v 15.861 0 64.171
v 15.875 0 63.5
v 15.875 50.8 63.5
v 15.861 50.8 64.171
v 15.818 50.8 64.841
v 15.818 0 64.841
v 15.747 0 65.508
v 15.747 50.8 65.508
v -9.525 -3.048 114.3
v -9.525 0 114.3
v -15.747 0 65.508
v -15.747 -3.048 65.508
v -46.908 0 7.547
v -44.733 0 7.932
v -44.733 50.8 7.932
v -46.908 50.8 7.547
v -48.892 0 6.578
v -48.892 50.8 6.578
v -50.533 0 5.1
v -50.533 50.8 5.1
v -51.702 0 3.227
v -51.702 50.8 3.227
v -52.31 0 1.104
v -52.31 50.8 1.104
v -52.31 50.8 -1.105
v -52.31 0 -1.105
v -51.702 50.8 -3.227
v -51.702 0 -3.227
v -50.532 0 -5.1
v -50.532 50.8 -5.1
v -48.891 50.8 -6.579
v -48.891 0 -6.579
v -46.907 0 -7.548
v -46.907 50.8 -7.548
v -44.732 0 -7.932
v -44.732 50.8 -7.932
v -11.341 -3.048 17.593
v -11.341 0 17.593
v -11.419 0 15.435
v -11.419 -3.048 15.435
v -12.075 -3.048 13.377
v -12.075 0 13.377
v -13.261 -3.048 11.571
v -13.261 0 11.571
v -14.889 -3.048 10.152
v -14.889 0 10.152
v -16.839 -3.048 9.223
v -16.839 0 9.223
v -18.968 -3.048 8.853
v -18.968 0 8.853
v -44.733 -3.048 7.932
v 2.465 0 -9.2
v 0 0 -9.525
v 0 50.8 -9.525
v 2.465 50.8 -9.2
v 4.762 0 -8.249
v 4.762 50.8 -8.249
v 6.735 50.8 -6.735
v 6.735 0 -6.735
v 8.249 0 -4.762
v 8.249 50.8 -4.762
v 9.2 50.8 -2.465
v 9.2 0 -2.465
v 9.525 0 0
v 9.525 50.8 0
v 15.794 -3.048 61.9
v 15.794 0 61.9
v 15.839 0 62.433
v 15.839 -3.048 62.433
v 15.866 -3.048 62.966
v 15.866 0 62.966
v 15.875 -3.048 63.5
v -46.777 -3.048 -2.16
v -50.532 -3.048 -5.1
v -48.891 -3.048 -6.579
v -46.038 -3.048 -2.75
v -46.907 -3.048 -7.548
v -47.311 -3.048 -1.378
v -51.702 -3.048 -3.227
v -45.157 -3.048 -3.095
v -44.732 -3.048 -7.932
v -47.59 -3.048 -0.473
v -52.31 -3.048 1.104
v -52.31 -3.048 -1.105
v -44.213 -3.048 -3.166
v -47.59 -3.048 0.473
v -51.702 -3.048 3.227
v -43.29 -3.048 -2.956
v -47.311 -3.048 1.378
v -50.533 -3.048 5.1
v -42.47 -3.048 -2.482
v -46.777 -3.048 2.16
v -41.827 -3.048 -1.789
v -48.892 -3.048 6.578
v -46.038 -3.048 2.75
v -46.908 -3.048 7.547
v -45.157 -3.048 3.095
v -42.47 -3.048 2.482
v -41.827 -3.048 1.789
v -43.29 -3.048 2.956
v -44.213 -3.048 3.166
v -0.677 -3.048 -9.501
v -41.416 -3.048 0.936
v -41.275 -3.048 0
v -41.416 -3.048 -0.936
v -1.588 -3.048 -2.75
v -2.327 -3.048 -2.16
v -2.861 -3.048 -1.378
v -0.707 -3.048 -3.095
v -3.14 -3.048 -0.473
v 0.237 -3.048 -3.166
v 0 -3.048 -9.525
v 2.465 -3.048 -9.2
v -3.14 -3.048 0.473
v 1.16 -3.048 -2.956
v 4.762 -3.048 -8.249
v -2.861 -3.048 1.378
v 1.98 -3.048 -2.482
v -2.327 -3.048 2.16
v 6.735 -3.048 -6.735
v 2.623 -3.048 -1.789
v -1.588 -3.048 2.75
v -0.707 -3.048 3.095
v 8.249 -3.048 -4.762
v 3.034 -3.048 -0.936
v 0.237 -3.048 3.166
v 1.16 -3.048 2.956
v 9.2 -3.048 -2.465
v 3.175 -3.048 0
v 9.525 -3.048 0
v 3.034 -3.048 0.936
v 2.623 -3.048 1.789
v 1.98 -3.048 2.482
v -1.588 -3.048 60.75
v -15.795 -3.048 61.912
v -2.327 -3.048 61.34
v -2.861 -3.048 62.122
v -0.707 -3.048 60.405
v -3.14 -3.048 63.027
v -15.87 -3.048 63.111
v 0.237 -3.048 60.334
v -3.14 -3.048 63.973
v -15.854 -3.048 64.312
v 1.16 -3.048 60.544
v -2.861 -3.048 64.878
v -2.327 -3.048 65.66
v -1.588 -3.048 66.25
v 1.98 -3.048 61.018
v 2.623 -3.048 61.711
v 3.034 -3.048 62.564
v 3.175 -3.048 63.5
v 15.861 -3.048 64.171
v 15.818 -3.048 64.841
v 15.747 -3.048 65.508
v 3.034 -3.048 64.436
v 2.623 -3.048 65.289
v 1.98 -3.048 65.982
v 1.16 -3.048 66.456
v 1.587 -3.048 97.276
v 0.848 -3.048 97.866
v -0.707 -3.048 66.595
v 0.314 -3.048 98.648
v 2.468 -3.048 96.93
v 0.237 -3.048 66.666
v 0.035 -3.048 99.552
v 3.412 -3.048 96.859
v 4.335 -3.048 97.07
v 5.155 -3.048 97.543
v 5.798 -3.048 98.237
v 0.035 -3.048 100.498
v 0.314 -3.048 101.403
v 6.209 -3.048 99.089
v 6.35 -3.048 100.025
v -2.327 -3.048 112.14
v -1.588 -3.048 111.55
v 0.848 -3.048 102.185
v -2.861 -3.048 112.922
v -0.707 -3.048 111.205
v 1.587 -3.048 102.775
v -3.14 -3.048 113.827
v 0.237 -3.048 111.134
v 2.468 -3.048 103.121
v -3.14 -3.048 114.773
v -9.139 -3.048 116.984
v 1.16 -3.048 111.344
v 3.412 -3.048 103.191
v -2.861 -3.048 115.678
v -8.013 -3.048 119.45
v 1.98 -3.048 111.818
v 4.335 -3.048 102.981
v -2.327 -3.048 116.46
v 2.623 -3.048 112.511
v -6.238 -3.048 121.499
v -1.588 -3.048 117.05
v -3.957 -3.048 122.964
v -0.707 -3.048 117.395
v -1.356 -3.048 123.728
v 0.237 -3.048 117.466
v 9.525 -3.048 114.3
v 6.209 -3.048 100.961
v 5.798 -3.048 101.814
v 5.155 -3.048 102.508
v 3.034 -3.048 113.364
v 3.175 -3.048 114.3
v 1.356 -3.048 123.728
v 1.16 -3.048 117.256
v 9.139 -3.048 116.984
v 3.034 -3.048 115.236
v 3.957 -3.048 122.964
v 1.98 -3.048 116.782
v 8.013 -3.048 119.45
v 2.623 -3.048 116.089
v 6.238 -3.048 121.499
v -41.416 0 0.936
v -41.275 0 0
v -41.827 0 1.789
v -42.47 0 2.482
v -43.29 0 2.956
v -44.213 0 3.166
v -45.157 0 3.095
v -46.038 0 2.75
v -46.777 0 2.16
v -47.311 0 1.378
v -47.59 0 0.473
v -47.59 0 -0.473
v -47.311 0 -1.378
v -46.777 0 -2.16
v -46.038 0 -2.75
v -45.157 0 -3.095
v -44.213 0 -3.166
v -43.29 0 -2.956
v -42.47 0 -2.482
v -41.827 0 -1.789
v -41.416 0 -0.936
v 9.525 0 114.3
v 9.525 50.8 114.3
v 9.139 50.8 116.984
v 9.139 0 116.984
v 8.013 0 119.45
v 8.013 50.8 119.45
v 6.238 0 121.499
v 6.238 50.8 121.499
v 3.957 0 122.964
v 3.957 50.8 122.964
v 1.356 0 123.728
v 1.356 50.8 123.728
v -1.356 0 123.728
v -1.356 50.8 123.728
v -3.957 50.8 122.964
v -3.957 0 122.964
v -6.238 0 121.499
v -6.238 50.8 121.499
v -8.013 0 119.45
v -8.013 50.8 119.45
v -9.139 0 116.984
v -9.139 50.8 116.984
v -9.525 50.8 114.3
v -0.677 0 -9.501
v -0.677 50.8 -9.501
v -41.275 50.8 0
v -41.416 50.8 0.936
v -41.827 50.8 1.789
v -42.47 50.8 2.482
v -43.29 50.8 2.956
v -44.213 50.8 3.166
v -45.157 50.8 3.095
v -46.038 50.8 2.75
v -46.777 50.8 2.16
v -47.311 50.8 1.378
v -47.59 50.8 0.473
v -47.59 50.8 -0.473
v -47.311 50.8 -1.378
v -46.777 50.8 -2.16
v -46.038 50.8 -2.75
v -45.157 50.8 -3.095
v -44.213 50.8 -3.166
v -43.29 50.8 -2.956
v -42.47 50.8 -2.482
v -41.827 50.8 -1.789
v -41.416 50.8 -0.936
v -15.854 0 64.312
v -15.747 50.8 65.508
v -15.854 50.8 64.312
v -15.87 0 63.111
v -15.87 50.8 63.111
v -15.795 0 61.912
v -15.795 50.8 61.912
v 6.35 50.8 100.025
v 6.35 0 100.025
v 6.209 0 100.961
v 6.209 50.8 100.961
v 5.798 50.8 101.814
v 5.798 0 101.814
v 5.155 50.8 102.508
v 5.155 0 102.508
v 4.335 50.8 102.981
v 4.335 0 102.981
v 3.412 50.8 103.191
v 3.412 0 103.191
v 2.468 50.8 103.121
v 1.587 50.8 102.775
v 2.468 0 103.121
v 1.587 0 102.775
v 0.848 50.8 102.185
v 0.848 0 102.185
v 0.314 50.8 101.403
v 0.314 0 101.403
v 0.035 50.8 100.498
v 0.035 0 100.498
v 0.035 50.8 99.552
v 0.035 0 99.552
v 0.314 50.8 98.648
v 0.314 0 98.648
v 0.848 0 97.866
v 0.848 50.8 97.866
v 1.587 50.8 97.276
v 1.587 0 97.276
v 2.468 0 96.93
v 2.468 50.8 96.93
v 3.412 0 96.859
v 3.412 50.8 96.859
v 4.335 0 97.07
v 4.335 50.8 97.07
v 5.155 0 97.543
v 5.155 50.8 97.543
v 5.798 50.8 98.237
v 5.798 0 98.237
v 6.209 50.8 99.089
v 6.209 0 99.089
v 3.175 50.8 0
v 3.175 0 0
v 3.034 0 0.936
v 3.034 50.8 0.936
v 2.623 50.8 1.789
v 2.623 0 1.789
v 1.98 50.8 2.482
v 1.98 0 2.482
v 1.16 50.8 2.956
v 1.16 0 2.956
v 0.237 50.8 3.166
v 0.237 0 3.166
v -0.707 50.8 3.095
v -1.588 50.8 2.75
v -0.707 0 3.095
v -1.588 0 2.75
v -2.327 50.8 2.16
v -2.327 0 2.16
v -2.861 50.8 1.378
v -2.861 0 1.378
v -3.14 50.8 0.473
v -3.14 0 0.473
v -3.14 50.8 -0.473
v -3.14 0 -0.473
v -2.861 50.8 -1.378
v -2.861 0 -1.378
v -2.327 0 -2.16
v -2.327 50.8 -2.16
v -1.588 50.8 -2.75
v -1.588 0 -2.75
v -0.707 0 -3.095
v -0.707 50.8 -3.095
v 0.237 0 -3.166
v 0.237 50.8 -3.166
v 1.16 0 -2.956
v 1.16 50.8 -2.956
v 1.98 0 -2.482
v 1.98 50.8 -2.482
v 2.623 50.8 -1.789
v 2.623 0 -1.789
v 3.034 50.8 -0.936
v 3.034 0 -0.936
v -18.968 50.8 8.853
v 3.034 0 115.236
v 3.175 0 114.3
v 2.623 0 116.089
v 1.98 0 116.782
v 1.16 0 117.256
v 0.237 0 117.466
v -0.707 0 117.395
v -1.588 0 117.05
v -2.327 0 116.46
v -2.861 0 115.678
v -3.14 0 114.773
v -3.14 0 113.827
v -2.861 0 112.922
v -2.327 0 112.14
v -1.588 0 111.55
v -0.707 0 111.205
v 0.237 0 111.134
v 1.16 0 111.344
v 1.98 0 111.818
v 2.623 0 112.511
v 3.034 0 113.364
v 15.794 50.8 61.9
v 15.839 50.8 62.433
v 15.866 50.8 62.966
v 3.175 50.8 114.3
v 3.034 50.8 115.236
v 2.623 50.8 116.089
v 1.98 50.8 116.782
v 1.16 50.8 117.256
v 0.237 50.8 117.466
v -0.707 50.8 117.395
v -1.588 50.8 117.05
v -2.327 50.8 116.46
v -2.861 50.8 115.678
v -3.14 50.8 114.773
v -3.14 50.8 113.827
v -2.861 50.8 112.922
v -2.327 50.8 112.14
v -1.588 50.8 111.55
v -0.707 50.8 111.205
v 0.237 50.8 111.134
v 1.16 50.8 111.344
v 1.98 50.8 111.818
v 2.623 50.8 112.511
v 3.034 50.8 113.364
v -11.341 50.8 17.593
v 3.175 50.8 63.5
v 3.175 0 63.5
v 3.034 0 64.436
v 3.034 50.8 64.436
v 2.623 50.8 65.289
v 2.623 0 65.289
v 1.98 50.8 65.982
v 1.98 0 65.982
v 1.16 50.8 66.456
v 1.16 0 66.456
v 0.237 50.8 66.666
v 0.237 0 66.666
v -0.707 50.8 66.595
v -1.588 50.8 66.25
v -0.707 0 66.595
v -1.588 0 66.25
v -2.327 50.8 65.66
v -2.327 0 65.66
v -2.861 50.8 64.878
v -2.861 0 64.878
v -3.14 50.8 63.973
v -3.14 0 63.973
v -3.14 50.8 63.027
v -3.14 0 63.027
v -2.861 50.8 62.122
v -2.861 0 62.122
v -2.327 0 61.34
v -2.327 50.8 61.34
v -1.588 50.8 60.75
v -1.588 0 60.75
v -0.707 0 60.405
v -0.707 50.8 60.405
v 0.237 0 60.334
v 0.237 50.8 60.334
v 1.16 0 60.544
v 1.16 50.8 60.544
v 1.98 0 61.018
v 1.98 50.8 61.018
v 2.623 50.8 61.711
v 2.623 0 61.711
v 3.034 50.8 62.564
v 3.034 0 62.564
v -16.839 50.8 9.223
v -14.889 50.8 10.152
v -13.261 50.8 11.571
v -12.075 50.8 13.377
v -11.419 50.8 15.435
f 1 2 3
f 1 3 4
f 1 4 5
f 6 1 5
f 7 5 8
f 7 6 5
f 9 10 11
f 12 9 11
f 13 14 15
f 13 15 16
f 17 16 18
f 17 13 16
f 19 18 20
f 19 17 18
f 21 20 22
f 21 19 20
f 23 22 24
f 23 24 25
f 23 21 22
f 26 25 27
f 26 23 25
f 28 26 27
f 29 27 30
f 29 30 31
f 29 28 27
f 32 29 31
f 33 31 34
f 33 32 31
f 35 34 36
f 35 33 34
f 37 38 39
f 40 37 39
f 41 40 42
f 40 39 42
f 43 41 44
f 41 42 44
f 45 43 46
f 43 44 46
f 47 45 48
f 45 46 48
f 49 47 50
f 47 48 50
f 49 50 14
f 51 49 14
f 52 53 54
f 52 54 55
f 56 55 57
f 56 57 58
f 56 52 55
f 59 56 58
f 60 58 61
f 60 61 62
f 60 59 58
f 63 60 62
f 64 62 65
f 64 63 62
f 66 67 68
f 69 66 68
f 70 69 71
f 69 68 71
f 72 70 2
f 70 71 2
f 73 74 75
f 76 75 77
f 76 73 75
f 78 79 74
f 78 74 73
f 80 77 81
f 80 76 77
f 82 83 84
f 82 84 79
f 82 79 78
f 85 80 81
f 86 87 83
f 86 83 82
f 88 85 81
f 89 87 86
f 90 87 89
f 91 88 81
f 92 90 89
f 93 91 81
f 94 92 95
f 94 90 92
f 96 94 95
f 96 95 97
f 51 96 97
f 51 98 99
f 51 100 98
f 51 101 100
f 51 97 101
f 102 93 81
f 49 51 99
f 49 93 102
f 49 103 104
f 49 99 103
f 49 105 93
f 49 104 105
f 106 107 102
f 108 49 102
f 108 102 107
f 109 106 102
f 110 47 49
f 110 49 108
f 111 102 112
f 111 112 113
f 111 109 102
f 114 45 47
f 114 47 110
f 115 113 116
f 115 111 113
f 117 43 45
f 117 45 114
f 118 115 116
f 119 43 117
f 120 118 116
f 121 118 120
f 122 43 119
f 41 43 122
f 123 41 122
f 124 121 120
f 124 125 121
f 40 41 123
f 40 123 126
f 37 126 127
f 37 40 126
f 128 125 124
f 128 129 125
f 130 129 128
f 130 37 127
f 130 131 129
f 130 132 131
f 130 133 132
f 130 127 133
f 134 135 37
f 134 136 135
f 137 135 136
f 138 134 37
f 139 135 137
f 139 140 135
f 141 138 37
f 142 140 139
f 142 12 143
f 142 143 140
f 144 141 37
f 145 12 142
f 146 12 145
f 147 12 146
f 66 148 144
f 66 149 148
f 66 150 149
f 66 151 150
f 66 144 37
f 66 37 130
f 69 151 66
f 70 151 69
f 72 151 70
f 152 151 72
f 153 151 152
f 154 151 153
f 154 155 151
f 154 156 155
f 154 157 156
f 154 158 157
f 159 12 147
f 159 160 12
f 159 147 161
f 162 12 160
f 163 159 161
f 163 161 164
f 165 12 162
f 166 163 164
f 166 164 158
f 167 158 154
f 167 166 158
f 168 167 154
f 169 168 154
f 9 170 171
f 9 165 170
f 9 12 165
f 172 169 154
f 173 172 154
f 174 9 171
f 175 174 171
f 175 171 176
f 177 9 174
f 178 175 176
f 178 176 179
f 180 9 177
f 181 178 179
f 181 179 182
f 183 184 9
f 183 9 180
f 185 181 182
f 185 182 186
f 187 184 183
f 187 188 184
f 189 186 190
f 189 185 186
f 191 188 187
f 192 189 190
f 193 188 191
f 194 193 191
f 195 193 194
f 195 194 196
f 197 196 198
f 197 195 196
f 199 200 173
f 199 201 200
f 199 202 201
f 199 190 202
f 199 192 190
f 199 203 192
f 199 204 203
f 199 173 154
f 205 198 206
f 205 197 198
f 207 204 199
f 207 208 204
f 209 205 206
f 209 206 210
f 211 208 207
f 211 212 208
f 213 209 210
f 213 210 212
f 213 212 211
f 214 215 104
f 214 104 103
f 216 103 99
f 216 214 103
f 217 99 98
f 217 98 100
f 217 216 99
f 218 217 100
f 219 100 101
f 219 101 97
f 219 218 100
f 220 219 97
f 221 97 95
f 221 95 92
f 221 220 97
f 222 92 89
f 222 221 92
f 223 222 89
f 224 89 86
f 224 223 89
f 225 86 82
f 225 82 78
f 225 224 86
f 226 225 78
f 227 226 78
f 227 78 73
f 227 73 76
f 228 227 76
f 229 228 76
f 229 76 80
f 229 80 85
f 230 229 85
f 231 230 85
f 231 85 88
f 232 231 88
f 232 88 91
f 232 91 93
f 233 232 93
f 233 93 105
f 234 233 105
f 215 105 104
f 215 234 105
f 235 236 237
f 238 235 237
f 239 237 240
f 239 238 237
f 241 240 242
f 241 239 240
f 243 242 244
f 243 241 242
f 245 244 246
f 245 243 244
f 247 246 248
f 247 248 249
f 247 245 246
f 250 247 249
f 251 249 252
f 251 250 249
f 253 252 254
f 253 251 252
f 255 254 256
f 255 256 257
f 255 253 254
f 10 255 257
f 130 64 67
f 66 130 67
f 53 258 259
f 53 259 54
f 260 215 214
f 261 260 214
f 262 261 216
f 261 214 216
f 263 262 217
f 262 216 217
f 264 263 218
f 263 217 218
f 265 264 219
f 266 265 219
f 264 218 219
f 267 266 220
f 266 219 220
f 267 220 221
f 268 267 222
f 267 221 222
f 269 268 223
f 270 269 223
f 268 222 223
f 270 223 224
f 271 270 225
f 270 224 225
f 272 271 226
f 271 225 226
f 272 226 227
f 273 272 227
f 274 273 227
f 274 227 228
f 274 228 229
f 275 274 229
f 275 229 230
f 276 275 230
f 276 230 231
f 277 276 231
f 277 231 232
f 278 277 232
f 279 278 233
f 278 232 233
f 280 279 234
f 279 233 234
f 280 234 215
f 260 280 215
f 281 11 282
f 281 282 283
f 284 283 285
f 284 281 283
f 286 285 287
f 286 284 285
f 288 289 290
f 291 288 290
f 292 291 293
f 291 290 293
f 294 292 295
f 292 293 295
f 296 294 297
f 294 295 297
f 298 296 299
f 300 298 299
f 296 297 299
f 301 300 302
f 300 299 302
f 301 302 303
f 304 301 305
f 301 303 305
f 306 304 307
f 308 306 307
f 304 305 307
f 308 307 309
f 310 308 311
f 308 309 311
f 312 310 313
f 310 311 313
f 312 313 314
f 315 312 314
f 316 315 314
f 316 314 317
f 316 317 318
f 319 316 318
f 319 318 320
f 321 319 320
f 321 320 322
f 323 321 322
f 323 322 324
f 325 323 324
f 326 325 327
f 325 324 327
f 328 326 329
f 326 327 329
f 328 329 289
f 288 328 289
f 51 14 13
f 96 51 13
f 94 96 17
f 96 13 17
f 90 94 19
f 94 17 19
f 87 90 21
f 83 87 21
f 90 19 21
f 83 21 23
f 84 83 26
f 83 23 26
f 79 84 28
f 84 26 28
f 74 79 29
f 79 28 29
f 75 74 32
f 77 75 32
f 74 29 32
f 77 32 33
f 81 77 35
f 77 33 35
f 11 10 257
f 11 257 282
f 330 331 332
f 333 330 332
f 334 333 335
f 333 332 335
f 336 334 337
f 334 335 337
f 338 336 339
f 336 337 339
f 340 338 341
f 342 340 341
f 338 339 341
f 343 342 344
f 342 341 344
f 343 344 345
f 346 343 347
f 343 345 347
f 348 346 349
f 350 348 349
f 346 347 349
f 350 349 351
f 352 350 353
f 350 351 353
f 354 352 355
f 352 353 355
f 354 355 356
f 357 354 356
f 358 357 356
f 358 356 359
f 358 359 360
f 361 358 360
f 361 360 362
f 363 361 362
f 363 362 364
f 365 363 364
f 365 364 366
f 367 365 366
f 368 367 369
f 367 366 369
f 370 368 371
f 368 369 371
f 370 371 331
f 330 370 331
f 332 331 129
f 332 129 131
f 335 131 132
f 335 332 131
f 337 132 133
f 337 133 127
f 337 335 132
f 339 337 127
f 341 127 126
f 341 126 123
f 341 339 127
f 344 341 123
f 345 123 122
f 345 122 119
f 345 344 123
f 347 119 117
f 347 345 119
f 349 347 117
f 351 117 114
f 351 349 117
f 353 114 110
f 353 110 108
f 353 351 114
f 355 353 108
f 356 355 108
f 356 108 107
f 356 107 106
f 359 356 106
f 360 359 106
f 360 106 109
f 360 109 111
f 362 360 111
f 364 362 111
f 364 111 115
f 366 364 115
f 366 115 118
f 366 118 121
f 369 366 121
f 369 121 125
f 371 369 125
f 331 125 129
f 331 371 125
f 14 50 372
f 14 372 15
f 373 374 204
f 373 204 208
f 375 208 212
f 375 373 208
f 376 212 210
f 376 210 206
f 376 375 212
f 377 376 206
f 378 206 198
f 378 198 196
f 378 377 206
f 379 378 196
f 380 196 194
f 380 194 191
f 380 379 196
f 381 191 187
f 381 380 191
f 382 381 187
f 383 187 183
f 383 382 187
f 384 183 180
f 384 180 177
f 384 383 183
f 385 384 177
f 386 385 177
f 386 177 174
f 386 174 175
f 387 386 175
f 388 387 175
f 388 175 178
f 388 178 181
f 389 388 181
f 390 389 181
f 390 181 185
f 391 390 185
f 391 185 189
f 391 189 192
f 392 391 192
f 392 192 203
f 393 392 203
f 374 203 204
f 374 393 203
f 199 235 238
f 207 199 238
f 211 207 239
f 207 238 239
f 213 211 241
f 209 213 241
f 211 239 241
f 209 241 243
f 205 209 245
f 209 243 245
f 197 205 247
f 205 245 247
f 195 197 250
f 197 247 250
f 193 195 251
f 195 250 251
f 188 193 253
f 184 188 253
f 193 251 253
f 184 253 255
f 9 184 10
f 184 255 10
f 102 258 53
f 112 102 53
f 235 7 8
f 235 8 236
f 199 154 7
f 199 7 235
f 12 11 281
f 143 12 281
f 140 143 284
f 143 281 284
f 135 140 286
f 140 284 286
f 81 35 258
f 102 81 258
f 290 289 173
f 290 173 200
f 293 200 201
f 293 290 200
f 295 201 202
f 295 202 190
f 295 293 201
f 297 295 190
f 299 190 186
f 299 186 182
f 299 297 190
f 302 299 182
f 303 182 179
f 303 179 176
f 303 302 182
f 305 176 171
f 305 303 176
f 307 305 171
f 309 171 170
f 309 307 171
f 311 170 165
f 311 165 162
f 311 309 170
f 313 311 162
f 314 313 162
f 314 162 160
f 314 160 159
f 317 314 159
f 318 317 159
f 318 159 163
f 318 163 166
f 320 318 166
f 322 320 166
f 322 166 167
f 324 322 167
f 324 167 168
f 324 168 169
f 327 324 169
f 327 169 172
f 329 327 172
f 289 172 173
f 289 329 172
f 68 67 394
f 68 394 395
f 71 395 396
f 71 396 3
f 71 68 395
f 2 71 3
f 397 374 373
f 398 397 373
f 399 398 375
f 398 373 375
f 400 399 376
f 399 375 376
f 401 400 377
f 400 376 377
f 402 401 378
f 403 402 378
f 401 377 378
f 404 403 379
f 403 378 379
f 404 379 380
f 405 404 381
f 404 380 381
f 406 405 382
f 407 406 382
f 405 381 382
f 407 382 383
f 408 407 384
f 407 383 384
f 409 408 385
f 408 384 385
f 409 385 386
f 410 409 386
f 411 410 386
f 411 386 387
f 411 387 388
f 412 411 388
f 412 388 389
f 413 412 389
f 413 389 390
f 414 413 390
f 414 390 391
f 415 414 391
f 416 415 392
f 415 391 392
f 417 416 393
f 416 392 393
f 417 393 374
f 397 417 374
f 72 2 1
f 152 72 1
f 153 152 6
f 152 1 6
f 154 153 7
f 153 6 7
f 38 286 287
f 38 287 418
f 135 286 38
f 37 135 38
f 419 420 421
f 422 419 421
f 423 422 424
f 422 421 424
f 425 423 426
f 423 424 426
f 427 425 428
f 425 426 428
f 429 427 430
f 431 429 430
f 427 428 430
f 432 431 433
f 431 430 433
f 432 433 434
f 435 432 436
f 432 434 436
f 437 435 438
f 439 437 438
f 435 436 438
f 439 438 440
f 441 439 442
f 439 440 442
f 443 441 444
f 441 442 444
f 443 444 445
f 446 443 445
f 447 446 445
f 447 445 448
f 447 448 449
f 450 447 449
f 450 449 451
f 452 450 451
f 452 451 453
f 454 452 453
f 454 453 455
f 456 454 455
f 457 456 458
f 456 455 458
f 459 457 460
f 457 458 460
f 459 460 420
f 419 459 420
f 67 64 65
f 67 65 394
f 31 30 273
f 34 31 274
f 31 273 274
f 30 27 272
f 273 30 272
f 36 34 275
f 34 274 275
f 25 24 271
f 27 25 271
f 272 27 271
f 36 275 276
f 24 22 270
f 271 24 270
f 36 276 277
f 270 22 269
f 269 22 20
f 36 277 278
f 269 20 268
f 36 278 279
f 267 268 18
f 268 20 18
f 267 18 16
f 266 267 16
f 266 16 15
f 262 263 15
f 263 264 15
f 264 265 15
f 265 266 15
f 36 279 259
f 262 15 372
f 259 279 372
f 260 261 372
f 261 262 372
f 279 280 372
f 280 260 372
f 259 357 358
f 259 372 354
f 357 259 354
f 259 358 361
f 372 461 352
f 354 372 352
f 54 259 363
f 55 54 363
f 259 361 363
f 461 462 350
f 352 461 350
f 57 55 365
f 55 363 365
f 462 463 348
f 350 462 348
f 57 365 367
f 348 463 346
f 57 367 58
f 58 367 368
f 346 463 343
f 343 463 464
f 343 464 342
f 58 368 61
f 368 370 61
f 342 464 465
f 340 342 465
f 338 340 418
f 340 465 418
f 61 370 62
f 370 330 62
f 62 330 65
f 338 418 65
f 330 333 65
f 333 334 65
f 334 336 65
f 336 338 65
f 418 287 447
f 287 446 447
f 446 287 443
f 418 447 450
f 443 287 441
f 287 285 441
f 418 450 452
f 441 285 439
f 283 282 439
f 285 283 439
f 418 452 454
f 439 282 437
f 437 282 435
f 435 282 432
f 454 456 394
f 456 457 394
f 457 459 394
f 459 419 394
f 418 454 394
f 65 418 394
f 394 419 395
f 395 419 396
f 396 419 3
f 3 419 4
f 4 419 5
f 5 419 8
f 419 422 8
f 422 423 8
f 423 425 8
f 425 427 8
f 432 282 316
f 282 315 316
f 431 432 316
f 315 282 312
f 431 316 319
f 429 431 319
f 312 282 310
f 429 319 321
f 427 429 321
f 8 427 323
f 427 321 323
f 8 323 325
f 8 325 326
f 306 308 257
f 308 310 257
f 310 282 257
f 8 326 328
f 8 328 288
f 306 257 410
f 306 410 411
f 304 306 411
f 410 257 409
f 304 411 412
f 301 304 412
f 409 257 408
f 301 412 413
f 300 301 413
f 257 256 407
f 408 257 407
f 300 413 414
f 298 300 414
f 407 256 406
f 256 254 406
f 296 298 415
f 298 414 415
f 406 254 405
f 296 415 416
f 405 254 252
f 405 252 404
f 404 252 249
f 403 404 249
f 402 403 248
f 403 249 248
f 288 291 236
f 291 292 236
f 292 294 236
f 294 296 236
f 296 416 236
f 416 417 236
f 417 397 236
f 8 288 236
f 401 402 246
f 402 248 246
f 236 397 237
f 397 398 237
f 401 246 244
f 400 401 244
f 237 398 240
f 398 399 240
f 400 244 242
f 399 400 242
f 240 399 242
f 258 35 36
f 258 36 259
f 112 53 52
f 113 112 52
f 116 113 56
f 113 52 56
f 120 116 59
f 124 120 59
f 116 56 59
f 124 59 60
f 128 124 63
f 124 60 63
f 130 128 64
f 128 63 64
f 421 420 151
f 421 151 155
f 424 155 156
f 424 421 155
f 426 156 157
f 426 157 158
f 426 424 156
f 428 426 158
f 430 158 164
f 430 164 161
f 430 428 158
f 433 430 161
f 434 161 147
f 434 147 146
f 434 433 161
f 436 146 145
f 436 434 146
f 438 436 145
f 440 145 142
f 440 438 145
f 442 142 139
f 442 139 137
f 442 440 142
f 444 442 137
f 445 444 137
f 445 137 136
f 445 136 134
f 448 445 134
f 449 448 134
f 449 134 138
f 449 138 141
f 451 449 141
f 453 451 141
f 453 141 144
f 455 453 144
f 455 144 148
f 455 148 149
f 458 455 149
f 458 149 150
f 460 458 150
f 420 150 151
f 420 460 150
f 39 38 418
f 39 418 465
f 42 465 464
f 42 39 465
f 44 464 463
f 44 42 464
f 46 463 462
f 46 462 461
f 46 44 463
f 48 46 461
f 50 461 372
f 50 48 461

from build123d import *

# Parameters (mm, degrees)
F0_R     = 3.175
F1_DEPTH = 3.048
F2_DEPTH = 50.8


with BuildPart() as f1:
    # F0 (on Front) → F1 (new body)
    with BuildSketch(Plane.XZ):
        with BuildLine():
            Line((15.7474569047, 65.5082893304), (9.525, 114.3))
            ThreePointArc((9.525, 114.3), (0, 104.775), (-9.525, 114.3))
            Line((-9.525, 114.3), (-15.7474569047, 65.5082893304))
            ThreePointArc((-15.7474569047, 65.5082893304), (0, 79.375), (15.7474569047, 65.5082893304))
        make_face()
        with Locations((3.175, 100.0252)):
            Circle(F0_R, mode=Mode.SUBTRACT)
        with BuildLine():
            ThreePointArc((-9.525, 114.3), (0, 104.775), (9.525, 114.3))
            ThreePointArc((9.525, 114.3), (0, 123.825), (-9.525, 114.3))
        make_face()
        with Locations((0, 114.3)):
            Circle(F0_R, mode=Mode.SUBTRACT)
        with BuildLine():
            ThreePointArc((15.875, 63.5), (15.8430821396, 64.5061676396), (15.7474569047, 65.5082893304))
            ThreePointArc((15.7474569047, 65.5082893304), (0, 79.375), (-15.7474569047, 65.5082893304))
            ThreePointArc((-15.7474569047, 65.5082893304), (-15.8735876171, 63.7117573215), (-15.7954255641, 61.9125))
            ThreePointArc((-15.7954255641, 61.9125), (-0.0060905531, 47.6250011683), (15.7942028036, 61.9003804205))
            ThreePointArc((15.7942028036, 61.9003804205), (15.8547878338, 62.6991705884), (15.875, 63.5))
        make_face()
        with Locations((0, 63.5)):
            Circle(F0_R, mode=Mode.SUBTRACT)
        with BuildLine():
            ThreePointArc((15.7942028036, 61.9003804205), (-0.0060905531, 47.6250011683), (-15.7954255641, 61.9125))
            Line((-15.7954255641, 61.9125), (-11.3411865923, 17.5933818124))
            ThreePointArc((-11.3411865923, 17.5933818124), (-13.2611998974, 11.5713591498), (-18.9676000005, 8.8532337108))
            Line((-18.9676000005, 8.8532337108), (-44.7334821429, 7.9324362036))
            ThreePointArc((-44.7334821429, 7.9324362036), (-38.9384772185, 5.7120069047), (-36.5125, 0))
            ThreePointArc((-36.5125, 0), (-38.9380895153, -5.7116327839), (-44.7324052746, -7.9324746146))
            Line((-44.7324052746, -7.9324746146), (-0.6773435479, -9.500885786))
            ThreePointArc((-0.6773435479, -9.500885786), (-6.4912990883, 6.9705567315), (9.525, 0))
            Line((9.525, 0), (15.7942028036, 61.9003804205))
        make_face()
        with BuildLine():
            ThreePointArc((0, -9.525), (6.7351920908, -6.7351920908), (9.525, 0))
            ThreePointArc((9.525, 0), (-6.4912990883, 6.9705567315), (-0.6773435479, -9.500885786))
            Line((-0.6773435479, -9.500885786), (0, -9.525))
        make_face()
        Circle(F0_R, mode=Mode.SUBTRACT)
        with BuildLine():
            ThreePointArc((-36.5125, 0), (-38.9384772185, 5.7120069047), (-44.7334821429, 7.9324362036))
            ThreePointArc((-44.7334821429, 7.9324362036), (-52.3874999817, -0.0005387766), (-44.7324052746, -7.9324746146))
            ThreePointArc((-44.7324052746, -7.9324746146), (-38.9380895153, -5.7116327839), (-36.5125, 0))
        make_face()
        with Locations((-44.45, 0)):
            Circle(F0_R, mode=Mode.SUBTRACT)
    extrude(amount=F1_DEPTH)

    # F2 (add): a face of the model
    f2_faces = [f1.faces().sort_by_distance(p)[0] for p in [
        (-5.2061235435, 0, 46.6226606697),
    ]]
    extrude(f2_faces, amount=F2_DEPTH)


solid = f1.part
